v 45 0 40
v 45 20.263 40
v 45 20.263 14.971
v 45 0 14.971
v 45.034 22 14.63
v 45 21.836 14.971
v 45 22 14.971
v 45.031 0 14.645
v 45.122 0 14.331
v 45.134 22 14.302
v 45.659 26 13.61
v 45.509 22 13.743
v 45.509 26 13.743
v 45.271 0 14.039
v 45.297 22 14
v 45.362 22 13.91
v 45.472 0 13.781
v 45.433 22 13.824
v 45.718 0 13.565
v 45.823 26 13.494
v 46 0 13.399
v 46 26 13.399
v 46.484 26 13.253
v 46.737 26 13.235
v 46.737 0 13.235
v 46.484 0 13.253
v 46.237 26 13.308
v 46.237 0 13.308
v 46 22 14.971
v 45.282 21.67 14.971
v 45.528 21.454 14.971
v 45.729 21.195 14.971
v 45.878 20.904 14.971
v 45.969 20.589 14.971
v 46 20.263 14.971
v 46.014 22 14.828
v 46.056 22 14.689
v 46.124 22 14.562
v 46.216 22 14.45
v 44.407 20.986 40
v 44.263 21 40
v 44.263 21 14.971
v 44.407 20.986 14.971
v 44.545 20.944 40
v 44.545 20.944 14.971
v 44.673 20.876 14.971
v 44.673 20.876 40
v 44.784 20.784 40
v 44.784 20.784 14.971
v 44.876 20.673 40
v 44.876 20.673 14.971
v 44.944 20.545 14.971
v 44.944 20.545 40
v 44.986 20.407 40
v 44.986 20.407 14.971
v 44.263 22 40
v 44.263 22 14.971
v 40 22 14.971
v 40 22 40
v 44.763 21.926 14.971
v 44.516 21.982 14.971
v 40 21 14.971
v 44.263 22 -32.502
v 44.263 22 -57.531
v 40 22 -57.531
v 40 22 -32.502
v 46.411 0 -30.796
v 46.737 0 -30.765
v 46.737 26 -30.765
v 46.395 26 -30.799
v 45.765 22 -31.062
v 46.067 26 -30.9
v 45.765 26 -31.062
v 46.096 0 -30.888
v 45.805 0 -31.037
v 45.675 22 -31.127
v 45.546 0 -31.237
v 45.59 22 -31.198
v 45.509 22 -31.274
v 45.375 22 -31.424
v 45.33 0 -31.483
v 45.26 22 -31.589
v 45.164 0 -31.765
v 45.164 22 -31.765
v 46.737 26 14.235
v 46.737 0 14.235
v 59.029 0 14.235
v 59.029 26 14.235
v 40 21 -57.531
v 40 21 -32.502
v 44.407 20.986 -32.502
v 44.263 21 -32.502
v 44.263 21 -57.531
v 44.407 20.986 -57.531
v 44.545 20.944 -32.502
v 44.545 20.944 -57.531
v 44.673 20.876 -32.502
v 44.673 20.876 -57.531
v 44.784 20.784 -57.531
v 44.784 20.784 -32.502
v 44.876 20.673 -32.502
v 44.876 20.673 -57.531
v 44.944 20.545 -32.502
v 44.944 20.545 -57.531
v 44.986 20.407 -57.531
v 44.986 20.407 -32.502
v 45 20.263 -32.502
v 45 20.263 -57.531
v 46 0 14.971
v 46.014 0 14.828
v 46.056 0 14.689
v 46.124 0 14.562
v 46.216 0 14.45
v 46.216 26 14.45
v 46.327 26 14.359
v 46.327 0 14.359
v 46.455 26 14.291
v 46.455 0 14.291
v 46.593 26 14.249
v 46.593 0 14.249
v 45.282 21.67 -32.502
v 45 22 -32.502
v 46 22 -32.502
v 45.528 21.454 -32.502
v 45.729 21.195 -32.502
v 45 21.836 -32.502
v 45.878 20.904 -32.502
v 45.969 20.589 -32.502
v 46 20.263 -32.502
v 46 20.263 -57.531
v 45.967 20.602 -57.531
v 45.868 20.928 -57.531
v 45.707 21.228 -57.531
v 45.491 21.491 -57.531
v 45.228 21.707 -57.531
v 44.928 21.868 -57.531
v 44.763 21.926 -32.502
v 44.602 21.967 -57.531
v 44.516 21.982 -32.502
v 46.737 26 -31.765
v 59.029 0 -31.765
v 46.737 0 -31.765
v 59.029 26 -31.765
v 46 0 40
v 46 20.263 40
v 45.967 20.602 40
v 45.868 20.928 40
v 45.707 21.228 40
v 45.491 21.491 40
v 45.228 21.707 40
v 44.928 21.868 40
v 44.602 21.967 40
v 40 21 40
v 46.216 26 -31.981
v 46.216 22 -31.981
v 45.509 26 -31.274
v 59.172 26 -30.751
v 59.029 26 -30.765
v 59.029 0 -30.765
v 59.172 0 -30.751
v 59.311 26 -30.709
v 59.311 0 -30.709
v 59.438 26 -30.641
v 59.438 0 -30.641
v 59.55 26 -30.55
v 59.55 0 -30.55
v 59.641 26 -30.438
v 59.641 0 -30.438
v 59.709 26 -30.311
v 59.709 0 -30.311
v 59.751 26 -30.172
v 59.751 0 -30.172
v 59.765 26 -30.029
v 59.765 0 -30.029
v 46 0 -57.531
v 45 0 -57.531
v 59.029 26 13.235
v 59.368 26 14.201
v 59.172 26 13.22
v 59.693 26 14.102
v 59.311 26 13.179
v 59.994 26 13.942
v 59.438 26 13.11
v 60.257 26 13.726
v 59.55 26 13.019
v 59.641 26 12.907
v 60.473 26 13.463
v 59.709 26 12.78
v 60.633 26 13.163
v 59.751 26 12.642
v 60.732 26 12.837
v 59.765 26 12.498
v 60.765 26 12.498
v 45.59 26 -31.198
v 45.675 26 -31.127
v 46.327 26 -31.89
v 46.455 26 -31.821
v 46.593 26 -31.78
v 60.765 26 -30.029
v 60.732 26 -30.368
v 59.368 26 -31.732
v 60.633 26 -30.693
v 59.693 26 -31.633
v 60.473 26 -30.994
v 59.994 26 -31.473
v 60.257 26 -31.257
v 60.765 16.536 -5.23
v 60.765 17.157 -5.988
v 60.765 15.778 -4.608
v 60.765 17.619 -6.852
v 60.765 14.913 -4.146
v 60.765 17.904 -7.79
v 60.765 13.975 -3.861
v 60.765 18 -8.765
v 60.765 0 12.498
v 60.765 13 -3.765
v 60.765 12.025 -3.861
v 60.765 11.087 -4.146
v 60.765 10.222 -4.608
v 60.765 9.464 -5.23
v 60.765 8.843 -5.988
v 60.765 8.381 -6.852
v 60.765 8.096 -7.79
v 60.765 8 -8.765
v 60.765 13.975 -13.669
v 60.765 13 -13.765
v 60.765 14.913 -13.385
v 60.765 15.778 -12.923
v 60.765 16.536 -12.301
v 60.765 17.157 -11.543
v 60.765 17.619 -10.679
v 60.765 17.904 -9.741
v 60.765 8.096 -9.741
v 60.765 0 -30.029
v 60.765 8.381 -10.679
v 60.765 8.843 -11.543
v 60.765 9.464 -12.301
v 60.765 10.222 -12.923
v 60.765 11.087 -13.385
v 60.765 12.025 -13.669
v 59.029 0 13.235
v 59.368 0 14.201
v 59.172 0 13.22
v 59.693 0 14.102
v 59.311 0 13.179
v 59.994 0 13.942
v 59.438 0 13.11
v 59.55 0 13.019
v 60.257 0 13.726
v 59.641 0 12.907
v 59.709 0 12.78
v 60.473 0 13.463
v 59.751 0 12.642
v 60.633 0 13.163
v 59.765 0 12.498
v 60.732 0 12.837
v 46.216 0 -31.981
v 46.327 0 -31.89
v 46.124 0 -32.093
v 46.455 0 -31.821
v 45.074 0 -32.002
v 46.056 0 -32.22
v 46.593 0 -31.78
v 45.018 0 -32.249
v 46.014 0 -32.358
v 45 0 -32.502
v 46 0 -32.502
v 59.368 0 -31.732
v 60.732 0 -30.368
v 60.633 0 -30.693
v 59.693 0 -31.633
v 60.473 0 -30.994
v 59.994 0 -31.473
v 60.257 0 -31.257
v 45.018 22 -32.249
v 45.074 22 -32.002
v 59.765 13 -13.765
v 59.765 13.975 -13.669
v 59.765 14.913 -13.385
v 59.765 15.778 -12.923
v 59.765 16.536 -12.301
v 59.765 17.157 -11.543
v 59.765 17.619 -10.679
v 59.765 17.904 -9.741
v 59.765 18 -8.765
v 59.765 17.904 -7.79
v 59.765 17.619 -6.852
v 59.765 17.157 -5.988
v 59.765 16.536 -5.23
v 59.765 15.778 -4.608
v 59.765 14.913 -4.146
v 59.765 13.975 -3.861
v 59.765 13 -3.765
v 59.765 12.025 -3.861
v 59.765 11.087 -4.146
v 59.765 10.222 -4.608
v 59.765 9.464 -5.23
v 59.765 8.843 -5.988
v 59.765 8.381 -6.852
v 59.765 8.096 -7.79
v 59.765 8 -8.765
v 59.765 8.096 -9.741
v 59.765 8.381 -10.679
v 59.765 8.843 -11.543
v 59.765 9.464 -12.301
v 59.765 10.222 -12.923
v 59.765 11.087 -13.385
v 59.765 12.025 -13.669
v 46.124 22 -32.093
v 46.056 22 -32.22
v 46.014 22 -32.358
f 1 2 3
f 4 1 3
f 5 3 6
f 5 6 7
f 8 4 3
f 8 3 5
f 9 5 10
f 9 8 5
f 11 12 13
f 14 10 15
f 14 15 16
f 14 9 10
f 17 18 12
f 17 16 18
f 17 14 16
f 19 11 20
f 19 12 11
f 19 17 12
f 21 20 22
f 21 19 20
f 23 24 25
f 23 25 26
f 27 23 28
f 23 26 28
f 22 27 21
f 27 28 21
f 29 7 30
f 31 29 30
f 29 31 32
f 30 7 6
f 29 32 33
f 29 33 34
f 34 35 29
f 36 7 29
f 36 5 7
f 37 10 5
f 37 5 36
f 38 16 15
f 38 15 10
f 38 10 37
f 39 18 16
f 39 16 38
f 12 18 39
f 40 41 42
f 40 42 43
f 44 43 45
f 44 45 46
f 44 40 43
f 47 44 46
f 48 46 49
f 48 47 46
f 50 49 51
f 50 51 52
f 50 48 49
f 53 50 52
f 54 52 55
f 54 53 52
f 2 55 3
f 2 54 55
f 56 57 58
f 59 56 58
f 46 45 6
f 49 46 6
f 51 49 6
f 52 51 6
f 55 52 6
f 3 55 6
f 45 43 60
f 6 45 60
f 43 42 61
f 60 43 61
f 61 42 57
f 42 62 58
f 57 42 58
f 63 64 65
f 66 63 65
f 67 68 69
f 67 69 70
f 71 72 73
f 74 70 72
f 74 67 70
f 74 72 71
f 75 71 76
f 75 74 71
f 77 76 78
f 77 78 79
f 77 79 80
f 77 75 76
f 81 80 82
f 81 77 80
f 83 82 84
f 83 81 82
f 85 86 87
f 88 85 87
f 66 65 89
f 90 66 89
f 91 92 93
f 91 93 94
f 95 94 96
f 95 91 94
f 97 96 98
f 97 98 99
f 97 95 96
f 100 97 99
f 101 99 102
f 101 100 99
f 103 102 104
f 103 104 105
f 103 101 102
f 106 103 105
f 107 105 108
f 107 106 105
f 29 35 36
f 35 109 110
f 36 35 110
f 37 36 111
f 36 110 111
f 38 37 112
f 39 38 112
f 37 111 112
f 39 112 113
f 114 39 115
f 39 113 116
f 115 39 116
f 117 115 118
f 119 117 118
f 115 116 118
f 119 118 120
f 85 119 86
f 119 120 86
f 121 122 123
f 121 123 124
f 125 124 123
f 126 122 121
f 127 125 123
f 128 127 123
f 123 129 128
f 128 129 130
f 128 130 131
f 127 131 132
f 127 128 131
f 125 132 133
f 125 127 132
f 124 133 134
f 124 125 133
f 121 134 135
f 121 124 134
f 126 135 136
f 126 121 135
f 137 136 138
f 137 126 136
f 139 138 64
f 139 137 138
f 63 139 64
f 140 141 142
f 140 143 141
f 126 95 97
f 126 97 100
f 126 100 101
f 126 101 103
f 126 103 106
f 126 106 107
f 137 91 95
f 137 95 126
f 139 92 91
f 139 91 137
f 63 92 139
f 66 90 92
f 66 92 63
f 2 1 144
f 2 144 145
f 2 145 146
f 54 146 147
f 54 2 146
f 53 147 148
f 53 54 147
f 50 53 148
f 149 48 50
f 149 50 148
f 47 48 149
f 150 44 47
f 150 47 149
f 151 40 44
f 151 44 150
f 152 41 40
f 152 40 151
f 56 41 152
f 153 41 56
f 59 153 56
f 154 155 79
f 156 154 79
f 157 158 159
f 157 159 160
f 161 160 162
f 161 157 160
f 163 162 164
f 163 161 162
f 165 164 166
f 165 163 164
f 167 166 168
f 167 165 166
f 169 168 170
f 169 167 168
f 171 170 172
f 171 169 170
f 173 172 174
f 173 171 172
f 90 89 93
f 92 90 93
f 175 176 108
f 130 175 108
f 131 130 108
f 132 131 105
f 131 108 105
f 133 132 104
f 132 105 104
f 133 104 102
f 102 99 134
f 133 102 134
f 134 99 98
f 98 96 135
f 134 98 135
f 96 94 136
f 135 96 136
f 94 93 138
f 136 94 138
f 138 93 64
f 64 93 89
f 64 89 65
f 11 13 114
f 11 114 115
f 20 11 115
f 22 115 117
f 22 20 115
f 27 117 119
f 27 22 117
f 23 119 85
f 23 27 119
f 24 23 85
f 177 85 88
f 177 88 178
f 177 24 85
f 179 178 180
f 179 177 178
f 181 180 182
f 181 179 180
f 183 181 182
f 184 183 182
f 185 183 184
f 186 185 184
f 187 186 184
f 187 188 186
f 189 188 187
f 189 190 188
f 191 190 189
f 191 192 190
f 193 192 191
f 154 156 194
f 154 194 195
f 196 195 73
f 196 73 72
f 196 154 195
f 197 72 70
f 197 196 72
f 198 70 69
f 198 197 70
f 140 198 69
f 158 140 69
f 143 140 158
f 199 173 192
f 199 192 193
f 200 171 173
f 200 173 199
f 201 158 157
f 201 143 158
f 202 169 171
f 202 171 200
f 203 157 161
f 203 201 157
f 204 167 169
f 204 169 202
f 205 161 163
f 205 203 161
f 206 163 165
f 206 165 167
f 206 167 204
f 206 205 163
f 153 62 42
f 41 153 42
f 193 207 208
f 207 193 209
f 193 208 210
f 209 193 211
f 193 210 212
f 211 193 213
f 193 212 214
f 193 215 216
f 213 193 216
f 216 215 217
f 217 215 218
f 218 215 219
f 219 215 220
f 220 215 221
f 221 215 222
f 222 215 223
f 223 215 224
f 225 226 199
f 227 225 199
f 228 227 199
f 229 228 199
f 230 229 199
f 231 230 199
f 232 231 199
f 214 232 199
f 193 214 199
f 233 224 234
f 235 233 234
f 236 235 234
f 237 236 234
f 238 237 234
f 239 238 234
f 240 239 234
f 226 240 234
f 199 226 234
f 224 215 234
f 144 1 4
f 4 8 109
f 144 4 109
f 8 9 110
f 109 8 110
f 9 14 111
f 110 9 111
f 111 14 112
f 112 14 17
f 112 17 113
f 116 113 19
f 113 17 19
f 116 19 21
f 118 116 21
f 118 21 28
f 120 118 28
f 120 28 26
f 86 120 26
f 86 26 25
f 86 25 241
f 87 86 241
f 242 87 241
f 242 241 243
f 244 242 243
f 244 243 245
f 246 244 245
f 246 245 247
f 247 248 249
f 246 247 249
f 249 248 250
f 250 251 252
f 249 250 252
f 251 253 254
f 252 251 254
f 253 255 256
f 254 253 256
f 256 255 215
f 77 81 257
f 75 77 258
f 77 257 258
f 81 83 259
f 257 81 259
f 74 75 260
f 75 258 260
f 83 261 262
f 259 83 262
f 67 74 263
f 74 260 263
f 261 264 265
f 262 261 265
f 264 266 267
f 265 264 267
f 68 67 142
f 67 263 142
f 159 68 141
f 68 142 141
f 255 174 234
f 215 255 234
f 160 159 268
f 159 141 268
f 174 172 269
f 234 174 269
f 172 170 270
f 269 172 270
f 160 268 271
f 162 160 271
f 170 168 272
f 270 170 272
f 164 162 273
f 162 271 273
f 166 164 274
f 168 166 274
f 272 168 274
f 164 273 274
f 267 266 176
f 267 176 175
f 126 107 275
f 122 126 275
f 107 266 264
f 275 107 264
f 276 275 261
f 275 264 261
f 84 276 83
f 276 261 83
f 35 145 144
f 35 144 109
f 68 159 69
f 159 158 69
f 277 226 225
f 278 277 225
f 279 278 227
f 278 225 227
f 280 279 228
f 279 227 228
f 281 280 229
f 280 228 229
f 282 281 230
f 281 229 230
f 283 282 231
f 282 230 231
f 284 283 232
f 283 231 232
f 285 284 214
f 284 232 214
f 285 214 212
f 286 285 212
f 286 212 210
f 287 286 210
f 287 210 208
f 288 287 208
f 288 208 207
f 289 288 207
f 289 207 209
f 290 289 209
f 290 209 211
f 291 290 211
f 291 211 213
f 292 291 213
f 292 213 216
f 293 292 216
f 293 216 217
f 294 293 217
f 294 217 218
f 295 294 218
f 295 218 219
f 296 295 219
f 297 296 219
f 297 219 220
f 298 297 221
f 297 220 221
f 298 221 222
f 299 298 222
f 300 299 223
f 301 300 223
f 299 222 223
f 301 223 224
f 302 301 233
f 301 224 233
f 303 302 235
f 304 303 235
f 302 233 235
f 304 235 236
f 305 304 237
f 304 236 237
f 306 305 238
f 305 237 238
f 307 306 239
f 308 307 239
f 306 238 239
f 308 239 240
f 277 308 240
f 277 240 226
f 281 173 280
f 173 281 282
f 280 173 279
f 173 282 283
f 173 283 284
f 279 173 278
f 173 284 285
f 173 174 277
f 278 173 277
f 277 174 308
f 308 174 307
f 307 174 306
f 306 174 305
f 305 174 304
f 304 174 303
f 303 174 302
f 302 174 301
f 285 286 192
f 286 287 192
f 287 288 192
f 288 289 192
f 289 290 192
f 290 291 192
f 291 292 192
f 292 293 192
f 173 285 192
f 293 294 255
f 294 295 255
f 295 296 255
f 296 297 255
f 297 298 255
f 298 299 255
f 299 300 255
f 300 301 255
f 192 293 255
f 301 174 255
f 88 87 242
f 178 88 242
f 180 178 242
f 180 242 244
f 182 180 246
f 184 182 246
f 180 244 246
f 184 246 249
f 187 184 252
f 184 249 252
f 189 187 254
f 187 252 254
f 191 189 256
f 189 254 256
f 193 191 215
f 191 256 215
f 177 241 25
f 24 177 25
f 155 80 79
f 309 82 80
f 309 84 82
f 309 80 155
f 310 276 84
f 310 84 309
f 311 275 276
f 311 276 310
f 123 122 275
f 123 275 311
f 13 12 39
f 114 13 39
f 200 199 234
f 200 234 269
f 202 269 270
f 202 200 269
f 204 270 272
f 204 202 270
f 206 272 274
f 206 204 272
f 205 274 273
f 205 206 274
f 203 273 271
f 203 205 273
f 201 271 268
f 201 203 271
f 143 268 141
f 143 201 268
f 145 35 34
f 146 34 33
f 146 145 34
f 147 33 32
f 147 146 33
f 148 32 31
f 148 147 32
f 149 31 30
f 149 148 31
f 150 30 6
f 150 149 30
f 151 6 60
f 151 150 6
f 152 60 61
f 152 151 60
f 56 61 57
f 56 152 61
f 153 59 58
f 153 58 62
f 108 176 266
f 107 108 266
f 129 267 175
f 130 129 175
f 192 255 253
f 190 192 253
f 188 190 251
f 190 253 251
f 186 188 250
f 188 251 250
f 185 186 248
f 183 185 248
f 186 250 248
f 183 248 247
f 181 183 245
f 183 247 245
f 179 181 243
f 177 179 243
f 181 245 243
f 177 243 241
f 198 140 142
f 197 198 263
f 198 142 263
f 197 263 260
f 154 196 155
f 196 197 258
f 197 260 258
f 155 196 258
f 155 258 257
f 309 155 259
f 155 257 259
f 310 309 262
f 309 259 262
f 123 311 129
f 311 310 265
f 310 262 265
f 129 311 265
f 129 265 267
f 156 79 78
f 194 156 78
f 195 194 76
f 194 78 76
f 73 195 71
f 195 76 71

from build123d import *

# Parameters (mm, degrees)
SKETCH17_W                   = 46
SKETCH17_H                   = 26
BASE_FLANGE4_DEPTH           = 1
EDGE_FLANGE1_STRIP_W         = 5.4732
EDGE_FLANGE1_STRIP_H         = 1
EDGE_FLANGE1_STRIP_CUT_DEPTH = 26
EDGE_FLANGE1_DEPTH           = 26
SKETCH30_W                   = 26
SKETCH30_H                   = 22
TAB1_DEPTH                   = 1
SKETCHED_BEND3_DEPTH         = 26
SKETCHED_START               = 22
SKETCHED_BEND3_2_DEPTH       = 4
SKETCHED_BEND3_3_DEPTH       = 26
SKETCHED_BEND3_4_DEPTH       = 22
EDGE_FLANGE2_STRIP_W         = 5.4732
EDGE_FLANGE2_STRIP_H         = 1
EDGE_FLANGE2_STRIP_CUT_DEPTH = 25.028776631
EDGE_FLANGE2_DEPTH           = 25.028776631
EDGE_FLANGE3_STRIP_W         = 5.4732
EDGE_FLANGE3_STRIP_H         = 1
EDGE_FLANGE3_STRIP_CUT_DEPTH = 26
EDGE_FLANGE3_DEPTH           = 26
SKETCH40_W                   = 26
SKETCH40_H                   = 22
TAB2_DEPTH                   = 1
SKETCHED_BEND4_DEPTH         = 26
SKETCHED_BEND4_2_DEPTH       = 4
SKETCHED_BEND4_3_DEPTH       = 22
SKETCHED_BEND4_4_DEPTH       = 4
EDGE_FLANGE4_STRIP_W         = 5.4732
EDGE_FLANGE4_STRIP_H         = 1
EDGE_FLANGE4_STRIP_CUT_DEPTH = 25.028776631
EDGE_FLANGE4_DEPTH           = 25.028776631
SKETCH47_R                   = 5
CUT_EXTRUDE1_DEPTH           = 10


# Read off the part's stored shape, not the designer's step: Sketched Bend3, Sketched Bend4
# Sheet-metal steps are written as plain solids
with BuildPart() as part:
    # Sketch17 → Base-Flange4 (new body)
    with BuildSketch(Plane.XY):
        with Locations((23, 13)):
            Rectangle(SKETCH17_W, SKETCH17_H)
    extrude(amount=-BASE_FLANGE4_DEPTH)

    # Edge-Flange1 strip (across the edge) → Edge-Flange1 strip cut (cut)
    with BuildSketch(Plane(origin=(46, 0, 0), x_dir=(-1, 0, 0), z_dir=(0, 1, 0))):
        with Locations((-1, -0.5)):
            Rectangle(EDGE_FLANGE1_STRIP_W, EDGE_FLANGE1_STRIP_H)
    extrude(amount=EDGE_FLANGE1_STRIP_CUT_DEPTH, mode=Mode.SUBTRACT)

    # Edge-Flange1 section (across the edge) → Edge-Flange1 (add)
    with BuildSketch(Plane(origin=(46, 0, 0), x_dir=(-1, 0, 0), z_dir=(0, 1, 0))):
        with BuildLine():
            Line((0, 0.7366), (0, 14))
            Line((0, 14), (1, 14))
            Line((1, 14), (1, 0.7366))
            ThreePointArc((1, 0.7366), (1.215745145, 0.215745145), (1.7366, 0))
            Line((1.7366, 0), (1.7366, -1))
            ThreePointArc((1.7366, -1), (0.508638364, -0.491361636), (0, 0.7366))
        make_face()
    extrude(amount=EDGE_FLANGE1_DEPTH)

    # Sketch30 → Tab1 (add)
    with BuildSketch(Plane(origin=(46, 0, 0), x_dir=(0, 0, -1), z_dir=(1, 0, 0))):
        with Locations((-27, 11)):
            Rectangle(SKETCH30_W, SKETCH30_H)
    extrude(amount=-TAB1_DEPTH)

    # Sketched Bend3 outline → Sketched Bend3 (cut)
    with BuildSketch(Plane(origin=(0, 0, 0), x_dir=(1, 0, 0), z_dir=(0, 1, 0))):
        with BuildLine():
            Line((46, -13.398582279), (46, -0.7366))
            ThreePointArc((46, -0.7366), (45.491361636, 0.491361636), (44.2634, 1))
            Line((44.2634, 1), (0, 1))
            Line((0, 1), (0, 0))
            Line((0, 0), (44.2634, 0))
            ThreePointArc((44.2634, 0), (44.784254855, -0.215745145), (45, -0.7366))
            Line((45, -0.7366), (45, -14.971223369))
            ThreePointArc((45, -14.971223369), (45.271171885, -14.039397205), (46, -13.398582279))
        make_face()
    extrude(amount=SKETCHED_BEND3_DEPTH, mode=Mode.SUBTRACT)

    # Sketched Bend3 2 outline → Sketched Bend3 2 (cut)
    with BuildSketch(Plane(origin=(0, 0, 0), x_dir=(1, 0, 0), z_dir=(0, 1, 0)).offset(SKETCHED_START)):
        with BuildLine():
            Line((45.296980354, -14), (45.765376631, -14))
            Line((45.765376631, -14), (45.508638364, -13.743261733))
            ThreePointArc((45.508638364, -13.743261733), (45.396646229, -13.866549911), (45.296980354, -14))
        make_face()
    extrude(amount=SKETCHED_BEND3_2_DEPTH, mode=Mode.SUBTRACT)

    # Sketched Bend3 3 outline → Sketched Bend3 3 (add)
    with BuildSketch(Plane(origin=(0, 0, 0), x_dir=(1, 0, 0), z_dir=(0, 1, 0))):
        with BuildLine():
            Line((46.7366, -14.234623369), (59.028776631, -14.234623369))
            ThreePointArc((59.028776631, -14.234623369), (60.256738267, -13.725985005), (60.765376631, -12.498023369))
            Line((60.765376631, -12.498023369), (60.765376631, 31.765376631))
            Line((60.765376631, 31.765376631), (59.765376631, 31.765376631))
            Line((59.765376631, 31.765376631), (59.765376631, -12.498023369))
            ThreePointArc((59.765376631, -12.498023369), (59.549631486, -13.018878224), (59.028776631, -13.234623369))
            Line((59.028776631, -13.234623369), (46.7366, -13.234623369))
            ThreePointArc((46.7366, -13.234623369), (46.359286442, -13.276108612), (46, -13.398582279))
            Line((46, -13.398582279), (46, -14))
            Line((46, -14), (45.765376631, -14))
            Line((45.765376631, -14), (46.215745145, -14.450368514))
            ThreePointArc((46.215745145, -14.450368514), (46.454715384, -14.290693705), (46.7366, -14.234623369))
        make_face()
    extrude(amount=SKETCHED_BEND3_3_DEPTH)

    # Sketched Bend3 4 outline → Sketched Bend3 4 (add)
    with BuildSketch(Plane(origin=(0, 0, 0), x_dir=(1, 0, 0), z_dir=(0, 1, 0))):
        with BuildLine():
            ThreePointArc((46, -14.971223369), (46.056070336, -14.689338753), (46.215745145, -14.450368514))
            Line((46.215745145, -14.450368514), (46, -14.234623369))
            Line((46, -14.234623369), (46, -14.971223369))
        make_face()
    extrude(amount=SKETCHED_BEND3_4_DEPTH)

    # Edge-Flange2 strip (across the edge) → Edge-Flange2 strip cut (cut)
    with BuildSketch(Plane(origin=(45, 22, 40), x_dir=(0, -1, 0), z_dir=(0, 0, -1))):
        with Locations((-1, -0.5)):
            Rectangle(EDGE_FLANGE2_STRIP_W, EDGE_FLANGE2_STRIP_H)
    extrude(amount=EDGE_FLANGE2_STRIP_CUT_DEPTH, mode=Mode.SUBTRACT)

    # Edge-Flange2 section (across the edge) → Edge-Flange2 (add)
    with BuildSketch(Plane(origin=(45, 22, 40), x_dir=(0, -1, 0), z_dir=(0, 0, -1))):
        with BuildLine():
            Line((0, 0.7366), (0, 5))
            Line((0, 5), (1, 5))
            Line((1, 5), (1, 0.7366))
            ThreePointArc((1, 0.7366), (1.215745145, 0.215745145), (1.7366, 0))
            Line((1.7366, 0), (1.7366, -1))
            ThreePointArc((1.7366, -1), (0.508638364, -0.491361636), (0, 0.7366))
        make_face()
    extrude(amount=EDGE_FLANGE2_DEPTH)

    # Edge-Flange3 strip (across the edge) → Edge-Flange3 strip cut (cut)
    with BuildSketch(Plane(origin=(59.765376631, 26, -31.765376631), x_dir=(0, 0, 1), z_dir=(0, -1, 0))):
        with Locations((-1, -0.5)):
            Rectangle(EDGE_FLANGE3_STRIP_W, EDGE_FLANGE3_STRIP_H)
    extrude(amount=EDGE_FLANGE3_STRIP_CUT_DEPTH, mode=Mode.SUBTRACT)

    # Edge-Flange3 section (across the edge) → Edge-Flange3 (add)
    with BuildSketch(Plane(origin=(59.765376631, 26, -31.765376631), x_dir=(0, 0, 1), z_dir=(0, -1, 0))):
        with BuildLine():
            Line((0, 0.7366), (0, 14))
            Line((0, 14), (1, 14))
            Line((1, 14), (1, 0.7366))
            ThreePointArc((1, 0.7366), (1.215745145, 0.215745145), (1.7366, 0))
            Line((1.7366, 0), (1.7366, -1))
            ThreePointArc((1.7366, -1), (0.508638364, -0.491361636), (0, 0.7366))
        make_face()
    extrude(amount=EDGE_FLANGE3_DEPTH)

    # Sketch40 → Tab2 (add)
    with BuildSketch(Plane(origin=(0, 0, -31.765376631), x_dir=(-1, 0, 0), z_dir=(0, 0, -1))):
        with Locations((-32.765376631, 11)):
            Rectangle(SKETCH40_W, SKETCH40_H)
    extrude(amount=-TAB2_DEPTH)

    # Sketched Bend4 outline → Sketched Bend4 (cut)
    with BuildSketch(Plane(origin=(0, 0, 0), x_dir=(1, 0, 0), z_dir=(0, 1, 0))):
        with BuildLine():
            Line((45.16395891, 31.765376631), (19.765376631, 31.765376631))
            Line((19.765376631, 31.765376631), (19.765376631, 30.765376631))
            Line((19.765376631, 30.765376631), (46.7366, 30.765376631))
            ThreePointArc((46.7366, 30.765376631), (45.804773836, 31.036548516), (45.16395891, 31.765376631))
        make_face()
    extrude(amount=SKETCHED_BEND4_DEPTH, mode=Mode.SUBTRACT)

    # Sketched Bend4 2 outline → Sketched Bend4 2 (cut)
    with BuildSketch(Plane(origin=(0, 0, 0), x_dir=(1, 0, 0), z_dir=(0, 1, 0)).offset(SKETCHED_START)):
        Polygon((45.765376631, 31.530753262), (46, 31.765376631), (45.765376631, 31.765376631), align=None)
    extrude(amount=SKETCHED_BEND4_2_DEPTH, mode=Mode.SUBTRACT)

    # Sketched Bend4 3 outline → Sketched Bend4 3 (add)
    with BuildSketch(Plane(origin=(0, 0, 0), x_dir=(1, 0, 0), z_dir=(0, 1, 0))):
        with BuildLine():
            Line((46, 32.501976631), (46, 57.530753262))
            Line((46, 57.530753262), (45, 57.530753262))
            Line((45, 57.530753262), (45, 32.501976631))
            ThreePointArc((45, 32.501976631), (45.041485243, 32.124663073), (45.16395891, 31.765376631))
            Line((45.16395891, 31.765376631), (46.7366, 31.765376631))
            ThreePointArc((46.7366, 31.765376631), (46.215745145, 31.981121776), (46, 32.501976631))
        make_face()
    extrude(amount=SKETCHED_BEND4_3_DEPTH)

    # Sketched Bend4 4 outline → Sketched Bend4 4 (add)
    with BuildSketch(Plane(origin=(0, 0, 0), x_dir=(1, 0, 0), z_dir=(0, 1, 0)).offset(SKETCHED_START)):
        with BuildLine():
            ThreePointArc((46.7366, 31.765376631), (46.454715384, 31.821446967), (46.215745145, 31.981121776))
            Line((46.215745145, 31.981121776), (46, 31.765376631))
            Line((46, 31.765376631), (46.7366, 31.765376631))
        make_face()
        with BuildLine():
            Line((45.765376631, 31.062356985), (45.765376631, 31.530753262))
            Line((45.765376631, 31.530753262), (45.508638364, 31.274014995))
            ThreePointArc((45.508638364, 31.274014995), (45.631926542, 31.16202286), (45.765376631, 31.062356985))
        make_face()
    extrude(amount=SKETCHED_BEND4_4_DEPTH)

    # Edge-Flange4 strip (across the edge) → Edge-Flange4 strip cut (cut)
    with BuildSketch(Plane(origin=(45, 22, -32.501976631), x_dir=(0, -1, 0), z_dir=(0, 0, -1))):
        with Locations((-1, -0.5)):
            Rectangle(EDGE_FLANGE4_STRIP_W, EDGE_FLANGE4_STRIP_H)
    extrude(amount=EDGE_FLANGE4_STRIP_CUT_DEPTH, mode=Mode.SUBTRACT)

    # Edge-Flange4 section (across the edge) → Edge-Flange4 (add)
    with BuildSketch(Plane(origin=(45, 22, -32.501976631), x_dir=(0, -1, 0), z_dir=(0, 0, -1))):
        with BuildLine():
            Line((0, 0.7366), (0, 5))
            Line((0, 5), (1, 5))
            Line((1, 5), (1, 0.7366))
            ThreePointArc((1, 0.7366), (1.215745145, 0.215745145), (1.7366, 0))
            Line((1.7366, 0), (1.7366, -1))
            ThreePointArc((1.7366, -1), (0.508638364, -0.491361636), (0, 0.7366))
        make_face()
    extrude(amount=EDGE_FLANGE4_DEPTH)

    # Sketch47 → Cut-Extrude1 (cut)
    with BuildSketch(Plane(origin=(60.765376631, 0, 0), x_dir=(0, 0, -1), z_dir=(1, 0, 0))):
        with Locations((8.765376631, 13)):
            Circle(SKETCH47_R)
    extrude(amount=-CUT_EXTRUDE1_DEPTH, mode=Mode.SUBTRACT)


solid = part.part
